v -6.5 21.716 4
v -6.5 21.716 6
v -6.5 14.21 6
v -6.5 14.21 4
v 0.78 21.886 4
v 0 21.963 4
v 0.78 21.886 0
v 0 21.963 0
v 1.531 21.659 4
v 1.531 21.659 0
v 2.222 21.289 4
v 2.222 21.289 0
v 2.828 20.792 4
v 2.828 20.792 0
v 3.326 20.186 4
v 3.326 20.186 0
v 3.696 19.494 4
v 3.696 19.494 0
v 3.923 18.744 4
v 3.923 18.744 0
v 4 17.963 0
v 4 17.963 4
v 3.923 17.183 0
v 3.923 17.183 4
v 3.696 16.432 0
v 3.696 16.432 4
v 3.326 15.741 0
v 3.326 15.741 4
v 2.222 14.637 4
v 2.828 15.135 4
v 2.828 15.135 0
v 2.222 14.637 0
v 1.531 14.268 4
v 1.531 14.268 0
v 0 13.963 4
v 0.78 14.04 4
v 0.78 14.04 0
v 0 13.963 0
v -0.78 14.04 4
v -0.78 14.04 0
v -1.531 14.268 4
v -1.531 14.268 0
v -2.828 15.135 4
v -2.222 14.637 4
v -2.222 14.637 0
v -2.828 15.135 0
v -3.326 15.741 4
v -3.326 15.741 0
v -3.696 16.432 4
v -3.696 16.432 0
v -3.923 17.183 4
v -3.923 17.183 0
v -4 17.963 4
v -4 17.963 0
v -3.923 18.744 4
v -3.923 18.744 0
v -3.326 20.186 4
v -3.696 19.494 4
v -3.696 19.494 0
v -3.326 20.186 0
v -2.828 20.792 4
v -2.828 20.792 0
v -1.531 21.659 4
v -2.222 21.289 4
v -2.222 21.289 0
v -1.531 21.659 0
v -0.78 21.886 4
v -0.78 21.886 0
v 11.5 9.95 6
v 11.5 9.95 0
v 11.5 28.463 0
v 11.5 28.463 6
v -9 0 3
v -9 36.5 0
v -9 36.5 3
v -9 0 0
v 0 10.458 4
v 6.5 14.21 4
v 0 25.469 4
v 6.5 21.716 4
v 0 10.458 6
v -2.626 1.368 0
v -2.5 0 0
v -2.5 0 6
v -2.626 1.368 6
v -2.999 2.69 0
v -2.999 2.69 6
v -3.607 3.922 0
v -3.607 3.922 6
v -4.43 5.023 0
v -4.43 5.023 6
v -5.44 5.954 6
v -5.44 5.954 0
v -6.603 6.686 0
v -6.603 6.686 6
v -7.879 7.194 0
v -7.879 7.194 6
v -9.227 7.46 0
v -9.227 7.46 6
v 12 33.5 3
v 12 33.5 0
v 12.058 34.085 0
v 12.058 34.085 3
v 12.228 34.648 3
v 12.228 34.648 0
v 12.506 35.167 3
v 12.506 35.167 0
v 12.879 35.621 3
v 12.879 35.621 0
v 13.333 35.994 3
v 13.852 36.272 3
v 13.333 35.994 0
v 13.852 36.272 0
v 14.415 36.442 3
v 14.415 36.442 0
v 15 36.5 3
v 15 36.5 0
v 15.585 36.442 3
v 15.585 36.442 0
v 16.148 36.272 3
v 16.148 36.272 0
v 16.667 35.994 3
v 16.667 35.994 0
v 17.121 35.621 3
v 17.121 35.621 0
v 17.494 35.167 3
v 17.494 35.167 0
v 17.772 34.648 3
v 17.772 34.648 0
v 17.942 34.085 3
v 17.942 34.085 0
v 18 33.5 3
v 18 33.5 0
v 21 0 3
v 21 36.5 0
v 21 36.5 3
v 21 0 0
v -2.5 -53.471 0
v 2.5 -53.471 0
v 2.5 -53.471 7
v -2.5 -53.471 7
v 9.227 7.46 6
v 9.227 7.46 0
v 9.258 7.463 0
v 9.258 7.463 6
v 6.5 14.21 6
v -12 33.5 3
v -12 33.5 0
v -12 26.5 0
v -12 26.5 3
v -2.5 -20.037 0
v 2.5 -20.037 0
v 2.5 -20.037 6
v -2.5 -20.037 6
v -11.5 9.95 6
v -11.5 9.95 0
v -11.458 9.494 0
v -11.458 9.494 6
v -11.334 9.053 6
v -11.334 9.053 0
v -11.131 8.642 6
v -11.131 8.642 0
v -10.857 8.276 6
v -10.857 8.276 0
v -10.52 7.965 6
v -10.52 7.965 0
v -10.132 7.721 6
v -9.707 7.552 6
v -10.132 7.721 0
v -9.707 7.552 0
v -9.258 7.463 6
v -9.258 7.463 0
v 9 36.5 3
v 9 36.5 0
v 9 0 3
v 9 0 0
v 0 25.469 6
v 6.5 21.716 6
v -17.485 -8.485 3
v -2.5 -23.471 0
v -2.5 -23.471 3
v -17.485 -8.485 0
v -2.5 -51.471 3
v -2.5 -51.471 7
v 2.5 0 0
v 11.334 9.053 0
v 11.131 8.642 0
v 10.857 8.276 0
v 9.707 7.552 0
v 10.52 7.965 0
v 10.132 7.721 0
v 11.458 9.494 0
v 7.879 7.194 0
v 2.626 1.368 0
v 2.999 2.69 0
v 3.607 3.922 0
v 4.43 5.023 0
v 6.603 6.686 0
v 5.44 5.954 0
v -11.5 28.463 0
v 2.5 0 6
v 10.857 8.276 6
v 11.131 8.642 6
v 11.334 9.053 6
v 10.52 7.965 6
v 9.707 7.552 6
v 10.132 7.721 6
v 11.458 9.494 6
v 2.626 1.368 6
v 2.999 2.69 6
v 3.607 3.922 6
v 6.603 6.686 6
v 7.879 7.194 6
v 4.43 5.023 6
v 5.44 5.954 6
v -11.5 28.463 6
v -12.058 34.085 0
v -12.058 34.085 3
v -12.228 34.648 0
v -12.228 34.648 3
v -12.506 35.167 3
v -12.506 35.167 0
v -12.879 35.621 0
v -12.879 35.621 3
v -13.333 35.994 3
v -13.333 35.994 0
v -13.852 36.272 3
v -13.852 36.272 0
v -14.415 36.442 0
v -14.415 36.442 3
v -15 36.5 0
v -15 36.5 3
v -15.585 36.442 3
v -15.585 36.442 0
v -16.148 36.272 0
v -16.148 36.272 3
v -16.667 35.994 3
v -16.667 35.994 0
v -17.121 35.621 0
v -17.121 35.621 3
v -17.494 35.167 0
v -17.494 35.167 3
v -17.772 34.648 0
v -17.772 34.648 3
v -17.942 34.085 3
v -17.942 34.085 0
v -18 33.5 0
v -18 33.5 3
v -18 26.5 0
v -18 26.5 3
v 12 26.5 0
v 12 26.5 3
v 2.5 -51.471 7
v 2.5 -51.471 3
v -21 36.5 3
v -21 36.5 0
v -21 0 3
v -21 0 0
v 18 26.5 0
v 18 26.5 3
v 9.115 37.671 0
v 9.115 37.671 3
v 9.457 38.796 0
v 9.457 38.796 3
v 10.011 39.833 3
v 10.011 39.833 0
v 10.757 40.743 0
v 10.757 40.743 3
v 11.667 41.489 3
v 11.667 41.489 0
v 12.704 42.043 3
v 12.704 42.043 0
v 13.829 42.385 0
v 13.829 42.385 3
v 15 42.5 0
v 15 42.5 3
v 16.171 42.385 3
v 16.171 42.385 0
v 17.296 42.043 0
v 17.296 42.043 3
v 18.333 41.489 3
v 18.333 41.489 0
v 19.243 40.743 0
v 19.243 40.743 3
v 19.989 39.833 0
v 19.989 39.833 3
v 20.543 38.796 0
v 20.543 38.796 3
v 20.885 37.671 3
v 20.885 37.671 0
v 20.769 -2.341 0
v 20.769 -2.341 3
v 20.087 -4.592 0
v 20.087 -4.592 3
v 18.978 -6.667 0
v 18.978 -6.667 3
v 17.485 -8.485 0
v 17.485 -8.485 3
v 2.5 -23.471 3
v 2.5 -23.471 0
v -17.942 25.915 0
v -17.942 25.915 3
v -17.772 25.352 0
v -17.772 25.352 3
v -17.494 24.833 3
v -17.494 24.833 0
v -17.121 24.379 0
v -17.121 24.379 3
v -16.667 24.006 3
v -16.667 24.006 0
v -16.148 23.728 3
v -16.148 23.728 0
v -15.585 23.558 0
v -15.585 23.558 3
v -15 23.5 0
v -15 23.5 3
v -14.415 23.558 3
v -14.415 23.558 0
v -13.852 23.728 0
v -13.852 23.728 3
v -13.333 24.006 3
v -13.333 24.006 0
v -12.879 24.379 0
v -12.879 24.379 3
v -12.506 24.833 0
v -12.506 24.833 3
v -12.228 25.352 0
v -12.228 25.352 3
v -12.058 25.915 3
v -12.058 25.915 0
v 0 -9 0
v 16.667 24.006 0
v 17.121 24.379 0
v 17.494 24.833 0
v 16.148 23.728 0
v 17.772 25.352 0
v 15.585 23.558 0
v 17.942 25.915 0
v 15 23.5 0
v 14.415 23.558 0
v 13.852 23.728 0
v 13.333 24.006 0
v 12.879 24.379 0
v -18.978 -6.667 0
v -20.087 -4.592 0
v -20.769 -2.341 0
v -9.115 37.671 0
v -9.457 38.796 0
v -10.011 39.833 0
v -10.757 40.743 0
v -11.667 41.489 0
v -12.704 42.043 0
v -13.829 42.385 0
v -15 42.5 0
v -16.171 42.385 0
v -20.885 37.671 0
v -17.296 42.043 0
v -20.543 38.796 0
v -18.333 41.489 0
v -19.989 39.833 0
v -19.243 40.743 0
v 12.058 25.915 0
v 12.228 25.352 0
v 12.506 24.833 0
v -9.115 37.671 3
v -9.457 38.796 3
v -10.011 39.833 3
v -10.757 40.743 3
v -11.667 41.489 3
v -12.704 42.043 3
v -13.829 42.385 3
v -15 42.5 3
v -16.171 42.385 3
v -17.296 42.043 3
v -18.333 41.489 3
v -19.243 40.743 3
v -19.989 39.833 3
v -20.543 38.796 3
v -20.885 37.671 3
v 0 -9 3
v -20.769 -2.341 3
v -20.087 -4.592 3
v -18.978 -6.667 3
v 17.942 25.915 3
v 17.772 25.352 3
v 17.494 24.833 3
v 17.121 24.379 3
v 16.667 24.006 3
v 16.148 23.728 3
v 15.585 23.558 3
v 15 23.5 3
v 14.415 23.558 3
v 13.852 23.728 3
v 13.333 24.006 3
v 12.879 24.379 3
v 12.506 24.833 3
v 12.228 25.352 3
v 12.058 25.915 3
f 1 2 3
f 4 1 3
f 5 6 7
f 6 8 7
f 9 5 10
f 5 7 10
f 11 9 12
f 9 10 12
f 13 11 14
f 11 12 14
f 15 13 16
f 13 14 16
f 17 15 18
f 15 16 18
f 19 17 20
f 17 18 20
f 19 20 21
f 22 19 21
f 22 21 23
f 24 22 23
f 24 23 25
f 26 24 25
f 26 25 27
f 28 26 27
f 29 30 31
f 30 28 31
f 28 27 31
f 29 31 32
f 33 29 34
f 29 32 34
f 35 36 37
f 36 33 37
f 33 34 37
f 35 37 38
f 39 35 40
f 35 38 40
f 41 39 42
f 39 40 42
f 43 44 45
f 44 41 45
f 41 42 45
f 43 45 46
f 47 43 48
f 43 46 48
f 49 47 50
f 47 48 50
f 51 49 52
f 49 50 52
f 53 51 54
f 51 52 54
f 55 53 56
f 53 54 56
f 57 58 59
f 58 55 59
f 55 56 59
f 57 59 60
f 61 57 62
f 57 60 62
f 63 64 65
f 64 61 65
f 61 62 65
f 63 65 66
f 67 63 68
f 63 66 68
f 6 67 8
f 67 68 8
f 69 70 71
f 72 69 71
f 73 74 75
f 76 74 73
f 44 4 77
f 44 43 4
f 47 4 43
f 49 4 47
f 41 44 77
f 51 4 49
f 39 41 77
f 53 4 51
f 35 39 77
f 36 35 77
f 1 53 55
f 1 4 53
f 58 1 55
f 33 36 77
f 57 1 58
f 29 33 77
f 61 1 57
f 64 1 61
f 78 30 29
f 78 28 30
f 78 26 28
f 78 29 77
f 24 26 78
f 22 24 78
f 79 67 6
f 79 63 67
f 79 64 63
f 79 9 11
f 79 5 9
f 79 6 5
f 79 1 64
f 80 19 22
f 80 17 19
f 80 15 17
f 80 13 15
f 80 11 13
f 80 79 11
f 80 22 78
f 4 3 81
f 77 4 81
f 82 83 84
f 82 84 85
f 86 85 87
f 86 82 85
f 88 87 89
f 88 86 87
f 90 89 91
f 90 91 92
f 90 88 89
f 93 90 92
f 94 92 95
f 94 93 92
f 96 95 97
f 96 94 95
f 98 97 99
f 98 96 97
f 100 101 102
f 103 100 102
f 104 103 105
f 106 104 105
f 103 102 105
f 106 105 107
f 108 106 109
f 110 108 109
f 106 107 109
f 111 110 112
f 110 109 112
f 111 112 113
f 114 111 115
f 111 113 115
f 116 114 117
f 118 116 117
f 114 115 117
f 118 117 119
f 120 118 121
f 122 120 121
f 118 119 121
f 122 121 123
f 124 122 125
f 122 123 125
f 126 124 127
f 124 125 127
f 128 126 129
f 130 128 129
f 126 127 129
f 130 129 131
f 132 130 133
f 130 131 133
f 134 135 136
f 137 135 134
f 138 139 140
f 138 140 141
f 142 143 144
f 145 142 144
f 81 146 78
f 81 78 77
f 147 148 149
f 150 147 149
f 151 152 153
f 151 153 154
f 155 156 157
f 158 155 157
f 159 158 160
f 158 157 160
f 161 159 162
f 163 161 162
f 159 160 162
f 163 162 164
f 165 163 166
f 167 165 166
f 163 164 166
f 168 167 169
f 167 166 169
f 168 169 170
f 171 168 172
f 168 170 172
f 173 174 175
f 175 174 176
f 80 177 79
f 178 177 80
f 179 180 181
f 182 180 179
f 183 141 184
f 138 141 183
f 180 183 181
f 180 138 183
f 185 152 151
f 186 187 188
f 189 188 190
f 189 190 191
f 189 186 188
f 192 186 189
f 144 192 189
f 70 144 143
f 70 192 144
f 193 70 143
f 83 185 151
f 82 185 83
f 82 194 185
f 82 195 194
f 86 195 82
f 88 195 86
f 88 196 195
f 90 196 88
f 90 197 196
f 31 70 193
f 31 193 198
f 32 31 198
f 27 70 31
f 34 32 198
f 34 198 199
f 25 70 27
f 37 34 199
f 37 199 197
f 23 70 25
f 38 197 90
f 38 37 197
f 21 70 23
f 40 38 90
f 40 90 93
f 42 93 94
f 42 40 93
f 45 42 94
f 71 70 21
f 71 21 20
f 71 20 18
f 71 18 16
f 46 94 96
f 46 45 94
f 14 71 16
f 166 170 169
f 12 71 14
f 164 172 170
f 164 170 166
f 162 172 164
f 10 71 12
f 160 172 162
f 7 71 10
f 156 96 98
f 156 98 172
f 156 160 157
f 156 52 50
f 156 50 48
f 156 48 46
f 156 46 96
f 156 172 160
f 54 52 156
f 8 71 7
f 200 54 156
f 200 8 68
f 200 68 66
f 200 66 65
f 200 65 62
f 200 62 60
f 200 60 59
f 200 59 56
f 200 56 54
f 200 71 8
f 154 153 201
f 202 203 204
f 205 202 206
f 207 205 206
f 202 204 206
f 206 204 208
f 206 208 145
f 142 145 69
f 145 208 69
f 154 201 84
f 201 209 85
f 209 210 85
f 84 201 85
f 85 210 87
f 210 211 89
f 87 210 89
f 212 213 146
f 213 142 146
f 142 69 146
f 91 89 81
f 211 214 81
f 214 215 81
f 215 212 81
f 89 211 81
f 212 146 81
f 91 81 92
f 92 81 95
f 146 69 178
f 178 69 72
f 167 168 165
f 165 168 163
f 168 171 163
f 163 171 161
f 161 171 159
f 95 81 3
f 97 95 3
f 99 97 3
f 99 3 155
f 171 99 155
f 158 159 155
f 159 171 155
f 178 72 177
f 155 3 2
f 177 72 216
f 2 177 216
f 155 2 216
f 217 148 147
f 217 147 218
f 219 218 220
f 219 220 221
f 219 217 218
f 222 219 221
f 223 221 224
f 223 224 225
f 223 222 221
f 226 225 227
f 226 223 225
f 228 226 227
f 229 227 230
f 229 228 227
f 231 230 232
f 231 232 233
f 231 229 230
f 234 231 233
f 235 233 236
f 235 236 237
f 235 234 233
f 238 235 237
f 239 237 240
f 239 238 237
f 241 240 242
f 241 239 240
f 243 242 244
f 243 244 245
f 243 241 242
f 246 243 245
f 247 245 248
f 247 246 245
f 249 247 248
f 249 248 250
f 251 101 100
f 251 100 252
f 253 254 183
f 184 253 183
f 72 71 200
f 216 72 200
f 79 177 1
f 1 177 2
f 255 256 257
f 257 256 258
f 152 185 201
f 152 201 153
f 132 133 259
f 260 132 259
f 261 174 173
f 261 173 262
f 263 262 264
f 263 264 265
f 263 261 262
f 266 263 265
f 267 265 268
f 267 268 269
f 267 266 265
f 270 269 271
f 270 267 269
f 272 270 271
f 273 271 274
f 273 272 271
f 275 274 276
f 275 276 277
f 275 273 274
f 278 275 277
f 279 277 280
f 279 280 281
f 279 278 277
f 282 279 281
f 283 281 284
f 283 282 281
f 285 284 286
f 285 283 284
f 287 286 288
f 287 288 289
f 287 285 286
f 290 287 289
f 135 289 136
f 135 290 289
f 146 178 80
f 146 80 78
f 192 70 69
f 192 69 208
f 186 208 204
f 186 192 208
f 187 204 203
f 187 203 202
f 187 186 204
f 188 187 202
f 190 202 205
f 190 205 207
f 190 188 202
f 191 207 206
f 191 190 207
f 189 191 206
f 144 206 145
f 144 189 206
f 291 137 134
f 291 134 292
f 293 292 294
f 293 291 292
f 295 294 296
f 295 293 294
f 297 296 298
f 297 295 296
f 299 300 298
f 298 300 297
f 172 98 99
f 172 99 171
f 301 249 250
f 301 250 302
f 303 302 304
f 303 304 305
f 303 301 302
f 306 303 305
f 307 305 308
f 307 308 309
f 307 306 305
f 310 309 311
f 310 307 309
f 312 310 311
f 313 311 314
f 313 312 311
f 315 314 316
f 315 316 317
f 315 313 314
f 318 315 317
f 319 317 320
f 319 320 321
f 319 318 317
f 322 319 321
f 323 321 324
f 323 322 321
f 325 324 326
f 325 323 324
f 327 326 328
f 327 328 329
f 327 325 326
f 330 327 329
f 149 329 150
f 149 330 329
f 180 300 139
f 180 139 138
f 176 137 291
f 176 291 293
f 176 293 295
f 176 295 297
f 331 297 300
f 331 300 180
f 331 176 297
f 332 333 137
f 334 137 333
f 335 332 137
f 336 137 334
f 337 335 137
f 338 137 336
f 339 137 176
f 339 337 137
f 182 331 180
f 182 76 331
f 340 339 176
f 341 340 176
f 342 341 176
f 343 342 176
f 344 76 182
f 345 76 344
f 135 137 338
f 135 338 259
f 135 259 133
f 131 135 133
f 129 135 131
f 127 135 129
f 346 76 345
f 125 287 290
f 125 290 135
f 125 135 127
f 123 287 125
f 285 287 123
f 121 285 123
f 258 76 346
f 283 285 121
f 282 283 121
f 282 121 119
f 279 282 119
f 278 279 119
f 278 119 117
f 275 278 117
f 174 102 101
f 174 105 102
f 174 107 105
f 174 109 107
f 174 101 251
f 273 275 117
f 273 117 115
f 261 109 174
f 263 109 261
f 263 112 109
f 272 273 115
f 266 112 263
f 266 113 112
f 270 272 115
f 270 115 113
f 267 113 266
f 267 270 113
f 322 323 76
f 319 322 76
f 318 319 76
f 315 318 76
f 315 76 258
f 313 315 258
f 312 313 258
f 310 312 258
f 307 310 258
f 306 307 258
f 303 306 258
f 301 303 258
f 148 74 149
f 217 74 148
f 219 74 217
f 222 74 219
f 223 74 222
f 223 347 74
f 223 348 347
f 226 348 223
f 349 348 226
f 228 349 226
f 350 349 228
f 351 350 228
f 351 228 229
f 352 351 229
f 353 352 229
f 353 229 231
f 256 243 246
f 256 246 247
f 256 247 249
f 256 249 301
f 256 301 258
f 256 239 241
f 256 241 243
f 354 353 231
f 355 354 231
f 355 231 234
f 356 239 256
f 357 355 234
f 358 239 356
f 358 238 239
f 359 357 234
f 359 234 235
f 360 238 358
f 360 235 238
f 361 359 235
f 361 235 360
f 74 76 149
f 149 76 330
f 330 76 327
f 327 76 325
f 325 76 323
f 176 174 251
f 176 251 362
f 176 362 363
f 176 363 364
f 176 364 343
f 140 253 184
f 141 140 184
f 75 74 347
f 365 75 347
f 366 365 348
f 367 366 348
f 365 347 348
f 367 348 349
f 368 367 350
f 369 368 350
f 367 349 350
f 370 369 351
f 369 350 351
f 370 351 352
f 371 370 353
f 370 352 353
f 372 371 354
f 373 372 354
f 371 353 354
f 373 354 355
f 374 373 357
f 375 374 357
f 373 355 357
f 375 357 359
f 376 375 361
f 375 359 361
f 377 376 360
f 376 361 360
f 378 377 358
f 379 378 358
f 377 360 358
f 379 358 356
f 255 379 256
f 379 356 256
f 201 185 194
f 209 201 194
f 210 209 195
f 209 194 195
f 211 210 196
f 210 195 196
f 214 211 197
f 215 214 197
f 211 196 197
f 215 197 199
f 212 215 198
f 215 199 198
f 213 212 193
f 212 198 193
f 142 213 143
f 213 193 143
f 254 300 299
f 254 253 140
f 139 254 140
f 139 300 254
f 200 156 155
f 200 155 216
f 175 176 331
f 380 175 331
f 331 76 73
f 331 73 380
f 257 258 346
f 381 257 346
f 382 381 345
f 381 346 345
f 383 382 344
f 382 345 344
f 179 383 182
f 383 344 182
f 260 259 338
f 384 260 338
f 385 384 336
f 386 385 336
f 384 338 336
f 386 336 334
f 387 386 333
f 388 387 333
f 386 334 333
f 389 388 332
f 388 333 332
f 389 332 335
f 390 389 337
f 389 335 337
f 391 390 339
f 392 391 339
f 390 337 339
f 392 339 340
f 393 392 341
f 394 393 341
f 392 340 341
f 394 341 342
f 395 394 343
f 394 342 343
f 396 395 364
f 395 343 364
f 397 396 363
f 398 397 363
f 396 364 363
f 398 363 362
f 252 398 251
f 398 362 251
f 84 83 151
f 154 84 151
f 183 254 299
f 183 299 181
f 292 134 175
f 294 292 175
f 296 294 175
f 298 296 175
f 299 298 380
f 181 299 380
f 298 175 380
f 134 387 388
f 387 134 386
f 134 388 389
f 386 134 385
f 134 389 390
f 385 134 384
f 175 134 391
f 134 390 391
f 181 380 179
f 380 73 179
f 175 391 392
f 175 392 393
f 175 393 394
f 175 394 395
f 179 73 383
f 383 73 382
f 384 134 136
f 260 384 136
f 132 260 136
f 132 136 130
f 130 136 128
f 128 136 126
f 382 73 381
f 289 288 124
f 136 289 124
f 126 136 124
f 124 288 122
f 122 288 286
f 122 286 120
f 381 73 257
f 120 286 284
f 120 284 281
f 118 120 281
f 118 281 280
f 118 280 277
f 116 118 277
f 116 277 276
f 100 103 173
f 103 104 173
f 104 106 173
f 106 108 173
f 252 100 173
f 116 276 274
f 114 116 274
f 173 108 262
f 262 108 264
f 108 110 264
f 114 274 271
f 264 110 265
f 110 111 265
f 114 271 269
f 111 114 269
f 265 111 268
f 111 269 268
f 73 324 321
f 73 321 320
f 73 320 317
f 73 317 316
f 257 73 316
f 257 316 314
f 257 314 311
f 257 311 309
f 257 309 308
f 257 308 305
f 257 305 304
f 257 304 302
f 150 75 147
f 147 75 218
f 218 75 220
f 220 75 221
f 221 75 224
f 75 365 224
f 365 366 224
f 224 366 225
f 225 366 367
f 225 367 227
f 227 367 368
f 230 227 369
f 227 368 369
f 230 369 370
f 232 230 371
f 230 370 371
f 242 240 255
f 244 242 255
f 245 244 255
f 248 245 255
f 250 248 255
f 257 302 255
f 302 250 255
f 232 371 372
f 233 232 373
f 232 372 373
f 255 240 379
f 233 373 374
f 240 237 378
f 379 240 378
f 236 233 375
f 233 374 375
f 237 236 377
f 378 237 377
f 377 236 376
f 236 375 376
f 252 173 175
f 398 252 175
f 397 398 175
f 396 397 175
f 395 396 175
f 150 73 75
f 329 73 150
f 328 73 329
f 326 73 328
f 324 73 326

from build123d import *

# Parameters (mm, degrees)
PAD_DEPTH    = 3
SKETCH001_W  = 2.5
SKETCH001_H  = 2
PAD001_DEPTH = 4
PAD002_DEPTH = 6
POCKET_DEPTH = 2


with BuildPart() as body:
    # Sketch → Pad (new body)
    with BuildSketch(Plane.XY):
        with BuildLine():
            ThreePointArc((-9, 36.5), (-15, 42.5), (-21, 36.5))
            Line((-21, 36.5), (-21, 0))
            ThreePointArc((-21, 0), (-20.086557, -4.592195), (-17.485291, -8.485272))
            Line((-2.5, -23.470563), (-17.485291, -8.485272))
            Line((-2.5, -23.470563), (-2.5, -53.470563))
            Line((-2.5, -53.470563), (0, -53.470563))
            Line((0, -53.470563), (0, -9))
            Line((-9, 0), (0, -9))
            Line((-9, 36.5), (-9, 0))
        make_face()
        with BuildLine():
            ThreePointArc((-12, 33.5), (-15, 36.5), (-18, 33.5))
            Line((-18, 33.5), (-18, 26.5))
            ThreePointArc((-18, 26.5), (-15, 23.5), (-12, 26.5))
            Line((-12, 33.5), (-12, 26.5))
        make_face(mode=Mode.SUBTRACT)
    pad = extrude(amount=PAD_DEPTH)

    # Sketch001 (on Face15 of Pad) → Pad001 (join)
    with BuildSketch(Plane.XY.offset(3)):
        with Locations((-1.25, -52.470563)):
            Rectangle(SKETCH001_W, SKETCH001_H)
    pad001 = extrude(amount=PAD001_DEPTH)

    # Mirrored: Pad001, Pad across Sketch001 V_Axis
    add(pad001.mirror(Plane(origin=(0, 0, 3), x_dir=(0, 0, 1), z_dir=(1, 0, 0))))
    add(pad.mirror(Plane(origin=(0, 0, 3), x_dir=(0, 0, 1), z_dir=(1, 0, 0))))


with BuildPart() as body001:
    # Sketch003 → Pad002 (new body)
    with BuildSketch(Plane.XY):
        with BuildLine():
            Line((-2.5, 0), (-2.5, -20.036778))
            Line((-2.5, -20.036778), (0, -20.036778))
            Line((0, -20.036778), (0, 13.963222))
            ThreePointArc((0, 21.963222), (-4, 17.963222), (0, 13.963222))
            Line((0, 21.963222), (0, 28.463222))
            Line((-11.5, 28.463222), (0, 28.463222))
            Line((-11.5, 9.94992), (-11.5, 28.463222))
            ThreePointArc((-11.5, 9.94992), (-10.856592, 8.275685), (-9.257548, 7.463222))
            Line((-9.227356, 7.460095), (-9.257548, 7.463222))
            ThreePointArc((-2.5, 0), (-4.430223, 5.022707), (-9.227356, 7.460095))
        make_face()
    pad002 = extrude(amount=PAD002_DEPTH)

    # Sketch004 (on Face12 of Pad002) → Pocket (cut)
    with BuildSketch(Plane.XY.offset(6)):
        Polygon((0, 25.468776), (-6.5, 21.715999), (-6.5, 14.210445), (0, 10.457669), (6.5, 14.210445), (6.5, 21.715999), align=None)
    pocket = extrude(amount=-POCKET_DEPTH, mode=Mode.SUBTRACT)

    # Mirrored001: Pad002, Pocket across Sketch003 V_Axis
    add(pad002.mirror(Plane(origin=(0, 0, 0), x_dir=(0, 0, 1), z_dir=(1, 0, 0))))
    add(pocket.mirror(Plane(origin=(0, 0, 0), x_dir=(0, 0, 1), z_dir=(1, 0, 0))), mode=Mode.SUBTRACT)


solid = Compound([body.part, body001.part])
